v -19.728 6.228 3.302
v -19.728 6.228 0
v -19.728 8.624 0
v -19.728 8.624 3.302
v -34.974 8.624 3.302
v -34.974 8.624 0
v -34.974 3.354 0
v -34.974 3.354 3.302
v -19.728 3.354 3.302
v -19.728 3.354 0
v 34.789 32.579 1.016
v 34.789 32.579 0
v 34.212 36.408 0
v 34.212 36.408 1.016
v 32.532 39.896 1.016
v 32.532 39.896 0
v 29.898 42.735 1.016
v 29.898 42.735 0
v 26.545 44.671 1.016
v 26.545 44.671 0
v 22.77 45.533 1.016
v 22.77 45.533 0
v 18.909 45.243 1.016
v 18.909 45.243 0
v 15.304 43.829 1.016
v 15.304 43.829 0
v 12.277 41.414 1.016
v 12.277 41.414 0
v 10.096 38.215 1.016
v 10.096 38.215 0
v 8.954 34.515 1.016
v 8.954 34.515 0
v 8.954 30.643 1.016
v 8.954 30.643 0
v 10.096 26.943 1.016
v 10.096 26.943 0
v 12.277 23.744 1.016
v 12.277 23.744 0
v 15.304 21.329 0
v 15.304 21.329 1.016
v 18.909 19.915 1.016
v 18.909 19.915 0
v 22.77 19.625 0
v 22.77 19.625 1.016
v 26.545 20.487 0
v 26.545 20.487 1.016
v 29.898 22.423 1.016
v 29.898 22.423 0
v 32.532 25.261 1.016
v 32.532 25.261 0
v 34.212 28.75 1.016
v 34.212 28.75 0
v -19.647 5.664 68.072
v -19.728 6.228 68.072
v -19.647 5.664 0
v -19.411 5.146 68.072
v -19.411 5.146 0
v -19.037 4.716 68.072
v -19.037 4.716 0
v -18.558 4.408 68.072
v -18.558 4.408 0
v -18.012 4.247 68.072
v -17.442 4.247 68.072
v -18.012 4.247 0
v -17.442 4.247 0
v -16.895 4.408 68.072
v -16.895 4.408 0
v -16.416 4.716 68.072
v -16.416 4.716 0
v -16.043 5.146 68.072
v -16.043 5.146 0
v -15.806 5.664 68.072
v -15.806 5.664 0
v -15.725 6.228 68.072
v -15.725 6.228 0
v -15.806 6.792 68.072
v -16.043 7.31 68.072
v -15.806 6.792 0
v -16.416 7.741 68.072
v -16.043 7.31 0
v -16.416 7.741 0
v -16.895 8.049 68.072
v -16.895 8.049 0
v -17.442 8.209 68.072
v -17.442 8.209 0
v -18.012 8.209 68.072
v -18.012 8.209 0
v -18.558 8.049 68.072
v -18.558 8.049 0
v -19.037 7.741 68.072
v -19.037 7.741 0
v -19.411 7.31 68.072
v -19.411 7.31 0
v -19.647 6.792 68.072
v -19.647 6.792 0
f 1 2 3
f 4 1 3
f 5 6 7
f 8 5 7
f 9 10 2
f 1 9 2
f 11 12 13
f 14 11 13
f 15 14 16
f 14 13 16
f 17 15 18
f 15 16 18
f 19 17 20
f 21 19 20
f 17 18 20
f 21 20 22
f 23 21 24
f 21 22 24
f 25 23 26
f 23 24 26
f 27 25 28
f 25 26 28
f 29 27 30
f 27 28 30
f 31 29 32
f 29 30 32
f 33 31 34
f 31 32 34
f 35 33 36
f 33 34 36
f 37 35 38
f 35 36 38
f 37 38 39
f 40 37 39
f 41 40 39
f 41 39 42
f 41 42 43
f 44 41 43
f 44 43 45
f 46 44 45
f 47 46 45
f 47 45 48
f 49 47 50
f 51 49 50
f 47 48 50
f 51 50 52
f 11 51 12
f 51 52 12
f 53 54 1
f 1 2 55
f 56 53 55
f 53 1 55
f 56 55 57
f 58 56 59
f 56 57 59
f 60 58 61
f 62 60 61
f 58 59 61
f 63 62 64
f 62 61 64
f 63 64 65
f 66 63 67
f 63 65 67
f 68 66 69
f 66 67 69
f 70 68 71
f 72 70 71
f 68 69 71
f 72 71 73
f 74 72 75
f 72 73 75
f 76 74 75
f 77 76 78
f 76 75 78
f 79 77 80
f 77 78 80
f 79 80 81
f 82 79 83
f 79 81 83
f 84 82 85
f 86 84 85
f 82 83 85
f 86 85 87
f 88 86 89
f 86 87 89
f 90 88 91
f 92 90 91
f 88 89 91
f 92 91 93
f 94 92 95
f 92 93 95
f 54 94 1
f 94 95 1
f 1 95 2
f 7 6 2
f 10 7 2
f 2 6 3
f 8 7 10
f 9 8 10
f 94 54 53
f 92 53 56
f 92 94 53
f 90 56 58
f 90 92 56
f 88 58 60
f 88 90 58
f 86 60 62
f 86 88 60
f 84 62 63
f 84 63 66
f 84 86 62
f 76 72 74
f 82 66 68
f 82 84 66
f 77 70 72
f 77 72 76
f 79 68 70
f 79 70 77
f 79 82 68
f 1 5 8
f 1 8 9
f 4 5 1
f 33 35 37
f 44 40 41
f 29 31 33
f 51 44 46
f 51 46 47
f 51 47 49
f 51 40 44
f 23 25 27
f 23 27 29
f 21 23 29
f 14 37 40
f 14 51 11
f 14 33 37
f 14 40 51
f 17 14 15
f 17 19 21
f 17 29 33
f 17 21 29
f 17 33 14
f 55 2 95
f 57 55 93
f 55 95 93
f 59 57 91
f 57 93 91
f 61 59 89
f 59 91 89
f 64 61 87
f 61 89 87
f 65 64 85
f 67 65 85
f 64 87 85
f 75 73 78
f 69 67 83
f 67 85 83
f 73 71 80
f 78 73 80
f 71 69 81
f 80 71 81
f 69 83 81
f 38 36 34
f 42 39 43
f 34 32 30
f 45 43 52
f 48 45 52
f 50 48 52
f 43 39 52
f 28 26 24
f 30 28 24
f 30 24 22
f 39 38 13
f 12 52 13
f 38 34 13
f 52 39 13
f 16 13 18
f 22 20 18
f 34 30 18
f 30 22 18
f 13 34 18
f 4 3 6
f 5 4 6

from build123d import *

# Parameters (mm, degrees)
F1_DEPTH = 68.072
F2_DEPTH = 3.302
F0_R     = 12.98991
F3_DEPTH = 1.016


with BuildPart() as f1:
    # F0 (on Top) → F1 (new body)
    with BuildSketch(Plane.XY):
        with BuildLine():
            ThreePointArc((-15.725264, 6.228324), (-17.726766, 8.229825), (-19.728268, 6.228324))
            ThreePointArc((-19.728268, 6.228324), (-17.726766, 4.226822), (-15.725264, 6.228324))
        make_face()
    extrude(amount=F1_DEPTH)

    # F0 (on Top) → F2 (join)
    with BuildSketch(Plane.XY):
        Polygon((-19.728268, 6.228324), (-19.728268, 8.623832), (-34.97443, 8.623832), (-34.97443, 3.353713), (-19.728268, 3.353713), align=None)
    extrude(amount=F2_DEPTH)


with BuildPart() as f3:
    # F0 (on Top) → F3 (new body)
    with BuildSketch(Plane.XY):
        with Locations((21.799132, 32.578923)):
            Circle(F0_R)
    extrude(amount=F3_DEPTH)


solid = Compound([f1.part, f3.part])
